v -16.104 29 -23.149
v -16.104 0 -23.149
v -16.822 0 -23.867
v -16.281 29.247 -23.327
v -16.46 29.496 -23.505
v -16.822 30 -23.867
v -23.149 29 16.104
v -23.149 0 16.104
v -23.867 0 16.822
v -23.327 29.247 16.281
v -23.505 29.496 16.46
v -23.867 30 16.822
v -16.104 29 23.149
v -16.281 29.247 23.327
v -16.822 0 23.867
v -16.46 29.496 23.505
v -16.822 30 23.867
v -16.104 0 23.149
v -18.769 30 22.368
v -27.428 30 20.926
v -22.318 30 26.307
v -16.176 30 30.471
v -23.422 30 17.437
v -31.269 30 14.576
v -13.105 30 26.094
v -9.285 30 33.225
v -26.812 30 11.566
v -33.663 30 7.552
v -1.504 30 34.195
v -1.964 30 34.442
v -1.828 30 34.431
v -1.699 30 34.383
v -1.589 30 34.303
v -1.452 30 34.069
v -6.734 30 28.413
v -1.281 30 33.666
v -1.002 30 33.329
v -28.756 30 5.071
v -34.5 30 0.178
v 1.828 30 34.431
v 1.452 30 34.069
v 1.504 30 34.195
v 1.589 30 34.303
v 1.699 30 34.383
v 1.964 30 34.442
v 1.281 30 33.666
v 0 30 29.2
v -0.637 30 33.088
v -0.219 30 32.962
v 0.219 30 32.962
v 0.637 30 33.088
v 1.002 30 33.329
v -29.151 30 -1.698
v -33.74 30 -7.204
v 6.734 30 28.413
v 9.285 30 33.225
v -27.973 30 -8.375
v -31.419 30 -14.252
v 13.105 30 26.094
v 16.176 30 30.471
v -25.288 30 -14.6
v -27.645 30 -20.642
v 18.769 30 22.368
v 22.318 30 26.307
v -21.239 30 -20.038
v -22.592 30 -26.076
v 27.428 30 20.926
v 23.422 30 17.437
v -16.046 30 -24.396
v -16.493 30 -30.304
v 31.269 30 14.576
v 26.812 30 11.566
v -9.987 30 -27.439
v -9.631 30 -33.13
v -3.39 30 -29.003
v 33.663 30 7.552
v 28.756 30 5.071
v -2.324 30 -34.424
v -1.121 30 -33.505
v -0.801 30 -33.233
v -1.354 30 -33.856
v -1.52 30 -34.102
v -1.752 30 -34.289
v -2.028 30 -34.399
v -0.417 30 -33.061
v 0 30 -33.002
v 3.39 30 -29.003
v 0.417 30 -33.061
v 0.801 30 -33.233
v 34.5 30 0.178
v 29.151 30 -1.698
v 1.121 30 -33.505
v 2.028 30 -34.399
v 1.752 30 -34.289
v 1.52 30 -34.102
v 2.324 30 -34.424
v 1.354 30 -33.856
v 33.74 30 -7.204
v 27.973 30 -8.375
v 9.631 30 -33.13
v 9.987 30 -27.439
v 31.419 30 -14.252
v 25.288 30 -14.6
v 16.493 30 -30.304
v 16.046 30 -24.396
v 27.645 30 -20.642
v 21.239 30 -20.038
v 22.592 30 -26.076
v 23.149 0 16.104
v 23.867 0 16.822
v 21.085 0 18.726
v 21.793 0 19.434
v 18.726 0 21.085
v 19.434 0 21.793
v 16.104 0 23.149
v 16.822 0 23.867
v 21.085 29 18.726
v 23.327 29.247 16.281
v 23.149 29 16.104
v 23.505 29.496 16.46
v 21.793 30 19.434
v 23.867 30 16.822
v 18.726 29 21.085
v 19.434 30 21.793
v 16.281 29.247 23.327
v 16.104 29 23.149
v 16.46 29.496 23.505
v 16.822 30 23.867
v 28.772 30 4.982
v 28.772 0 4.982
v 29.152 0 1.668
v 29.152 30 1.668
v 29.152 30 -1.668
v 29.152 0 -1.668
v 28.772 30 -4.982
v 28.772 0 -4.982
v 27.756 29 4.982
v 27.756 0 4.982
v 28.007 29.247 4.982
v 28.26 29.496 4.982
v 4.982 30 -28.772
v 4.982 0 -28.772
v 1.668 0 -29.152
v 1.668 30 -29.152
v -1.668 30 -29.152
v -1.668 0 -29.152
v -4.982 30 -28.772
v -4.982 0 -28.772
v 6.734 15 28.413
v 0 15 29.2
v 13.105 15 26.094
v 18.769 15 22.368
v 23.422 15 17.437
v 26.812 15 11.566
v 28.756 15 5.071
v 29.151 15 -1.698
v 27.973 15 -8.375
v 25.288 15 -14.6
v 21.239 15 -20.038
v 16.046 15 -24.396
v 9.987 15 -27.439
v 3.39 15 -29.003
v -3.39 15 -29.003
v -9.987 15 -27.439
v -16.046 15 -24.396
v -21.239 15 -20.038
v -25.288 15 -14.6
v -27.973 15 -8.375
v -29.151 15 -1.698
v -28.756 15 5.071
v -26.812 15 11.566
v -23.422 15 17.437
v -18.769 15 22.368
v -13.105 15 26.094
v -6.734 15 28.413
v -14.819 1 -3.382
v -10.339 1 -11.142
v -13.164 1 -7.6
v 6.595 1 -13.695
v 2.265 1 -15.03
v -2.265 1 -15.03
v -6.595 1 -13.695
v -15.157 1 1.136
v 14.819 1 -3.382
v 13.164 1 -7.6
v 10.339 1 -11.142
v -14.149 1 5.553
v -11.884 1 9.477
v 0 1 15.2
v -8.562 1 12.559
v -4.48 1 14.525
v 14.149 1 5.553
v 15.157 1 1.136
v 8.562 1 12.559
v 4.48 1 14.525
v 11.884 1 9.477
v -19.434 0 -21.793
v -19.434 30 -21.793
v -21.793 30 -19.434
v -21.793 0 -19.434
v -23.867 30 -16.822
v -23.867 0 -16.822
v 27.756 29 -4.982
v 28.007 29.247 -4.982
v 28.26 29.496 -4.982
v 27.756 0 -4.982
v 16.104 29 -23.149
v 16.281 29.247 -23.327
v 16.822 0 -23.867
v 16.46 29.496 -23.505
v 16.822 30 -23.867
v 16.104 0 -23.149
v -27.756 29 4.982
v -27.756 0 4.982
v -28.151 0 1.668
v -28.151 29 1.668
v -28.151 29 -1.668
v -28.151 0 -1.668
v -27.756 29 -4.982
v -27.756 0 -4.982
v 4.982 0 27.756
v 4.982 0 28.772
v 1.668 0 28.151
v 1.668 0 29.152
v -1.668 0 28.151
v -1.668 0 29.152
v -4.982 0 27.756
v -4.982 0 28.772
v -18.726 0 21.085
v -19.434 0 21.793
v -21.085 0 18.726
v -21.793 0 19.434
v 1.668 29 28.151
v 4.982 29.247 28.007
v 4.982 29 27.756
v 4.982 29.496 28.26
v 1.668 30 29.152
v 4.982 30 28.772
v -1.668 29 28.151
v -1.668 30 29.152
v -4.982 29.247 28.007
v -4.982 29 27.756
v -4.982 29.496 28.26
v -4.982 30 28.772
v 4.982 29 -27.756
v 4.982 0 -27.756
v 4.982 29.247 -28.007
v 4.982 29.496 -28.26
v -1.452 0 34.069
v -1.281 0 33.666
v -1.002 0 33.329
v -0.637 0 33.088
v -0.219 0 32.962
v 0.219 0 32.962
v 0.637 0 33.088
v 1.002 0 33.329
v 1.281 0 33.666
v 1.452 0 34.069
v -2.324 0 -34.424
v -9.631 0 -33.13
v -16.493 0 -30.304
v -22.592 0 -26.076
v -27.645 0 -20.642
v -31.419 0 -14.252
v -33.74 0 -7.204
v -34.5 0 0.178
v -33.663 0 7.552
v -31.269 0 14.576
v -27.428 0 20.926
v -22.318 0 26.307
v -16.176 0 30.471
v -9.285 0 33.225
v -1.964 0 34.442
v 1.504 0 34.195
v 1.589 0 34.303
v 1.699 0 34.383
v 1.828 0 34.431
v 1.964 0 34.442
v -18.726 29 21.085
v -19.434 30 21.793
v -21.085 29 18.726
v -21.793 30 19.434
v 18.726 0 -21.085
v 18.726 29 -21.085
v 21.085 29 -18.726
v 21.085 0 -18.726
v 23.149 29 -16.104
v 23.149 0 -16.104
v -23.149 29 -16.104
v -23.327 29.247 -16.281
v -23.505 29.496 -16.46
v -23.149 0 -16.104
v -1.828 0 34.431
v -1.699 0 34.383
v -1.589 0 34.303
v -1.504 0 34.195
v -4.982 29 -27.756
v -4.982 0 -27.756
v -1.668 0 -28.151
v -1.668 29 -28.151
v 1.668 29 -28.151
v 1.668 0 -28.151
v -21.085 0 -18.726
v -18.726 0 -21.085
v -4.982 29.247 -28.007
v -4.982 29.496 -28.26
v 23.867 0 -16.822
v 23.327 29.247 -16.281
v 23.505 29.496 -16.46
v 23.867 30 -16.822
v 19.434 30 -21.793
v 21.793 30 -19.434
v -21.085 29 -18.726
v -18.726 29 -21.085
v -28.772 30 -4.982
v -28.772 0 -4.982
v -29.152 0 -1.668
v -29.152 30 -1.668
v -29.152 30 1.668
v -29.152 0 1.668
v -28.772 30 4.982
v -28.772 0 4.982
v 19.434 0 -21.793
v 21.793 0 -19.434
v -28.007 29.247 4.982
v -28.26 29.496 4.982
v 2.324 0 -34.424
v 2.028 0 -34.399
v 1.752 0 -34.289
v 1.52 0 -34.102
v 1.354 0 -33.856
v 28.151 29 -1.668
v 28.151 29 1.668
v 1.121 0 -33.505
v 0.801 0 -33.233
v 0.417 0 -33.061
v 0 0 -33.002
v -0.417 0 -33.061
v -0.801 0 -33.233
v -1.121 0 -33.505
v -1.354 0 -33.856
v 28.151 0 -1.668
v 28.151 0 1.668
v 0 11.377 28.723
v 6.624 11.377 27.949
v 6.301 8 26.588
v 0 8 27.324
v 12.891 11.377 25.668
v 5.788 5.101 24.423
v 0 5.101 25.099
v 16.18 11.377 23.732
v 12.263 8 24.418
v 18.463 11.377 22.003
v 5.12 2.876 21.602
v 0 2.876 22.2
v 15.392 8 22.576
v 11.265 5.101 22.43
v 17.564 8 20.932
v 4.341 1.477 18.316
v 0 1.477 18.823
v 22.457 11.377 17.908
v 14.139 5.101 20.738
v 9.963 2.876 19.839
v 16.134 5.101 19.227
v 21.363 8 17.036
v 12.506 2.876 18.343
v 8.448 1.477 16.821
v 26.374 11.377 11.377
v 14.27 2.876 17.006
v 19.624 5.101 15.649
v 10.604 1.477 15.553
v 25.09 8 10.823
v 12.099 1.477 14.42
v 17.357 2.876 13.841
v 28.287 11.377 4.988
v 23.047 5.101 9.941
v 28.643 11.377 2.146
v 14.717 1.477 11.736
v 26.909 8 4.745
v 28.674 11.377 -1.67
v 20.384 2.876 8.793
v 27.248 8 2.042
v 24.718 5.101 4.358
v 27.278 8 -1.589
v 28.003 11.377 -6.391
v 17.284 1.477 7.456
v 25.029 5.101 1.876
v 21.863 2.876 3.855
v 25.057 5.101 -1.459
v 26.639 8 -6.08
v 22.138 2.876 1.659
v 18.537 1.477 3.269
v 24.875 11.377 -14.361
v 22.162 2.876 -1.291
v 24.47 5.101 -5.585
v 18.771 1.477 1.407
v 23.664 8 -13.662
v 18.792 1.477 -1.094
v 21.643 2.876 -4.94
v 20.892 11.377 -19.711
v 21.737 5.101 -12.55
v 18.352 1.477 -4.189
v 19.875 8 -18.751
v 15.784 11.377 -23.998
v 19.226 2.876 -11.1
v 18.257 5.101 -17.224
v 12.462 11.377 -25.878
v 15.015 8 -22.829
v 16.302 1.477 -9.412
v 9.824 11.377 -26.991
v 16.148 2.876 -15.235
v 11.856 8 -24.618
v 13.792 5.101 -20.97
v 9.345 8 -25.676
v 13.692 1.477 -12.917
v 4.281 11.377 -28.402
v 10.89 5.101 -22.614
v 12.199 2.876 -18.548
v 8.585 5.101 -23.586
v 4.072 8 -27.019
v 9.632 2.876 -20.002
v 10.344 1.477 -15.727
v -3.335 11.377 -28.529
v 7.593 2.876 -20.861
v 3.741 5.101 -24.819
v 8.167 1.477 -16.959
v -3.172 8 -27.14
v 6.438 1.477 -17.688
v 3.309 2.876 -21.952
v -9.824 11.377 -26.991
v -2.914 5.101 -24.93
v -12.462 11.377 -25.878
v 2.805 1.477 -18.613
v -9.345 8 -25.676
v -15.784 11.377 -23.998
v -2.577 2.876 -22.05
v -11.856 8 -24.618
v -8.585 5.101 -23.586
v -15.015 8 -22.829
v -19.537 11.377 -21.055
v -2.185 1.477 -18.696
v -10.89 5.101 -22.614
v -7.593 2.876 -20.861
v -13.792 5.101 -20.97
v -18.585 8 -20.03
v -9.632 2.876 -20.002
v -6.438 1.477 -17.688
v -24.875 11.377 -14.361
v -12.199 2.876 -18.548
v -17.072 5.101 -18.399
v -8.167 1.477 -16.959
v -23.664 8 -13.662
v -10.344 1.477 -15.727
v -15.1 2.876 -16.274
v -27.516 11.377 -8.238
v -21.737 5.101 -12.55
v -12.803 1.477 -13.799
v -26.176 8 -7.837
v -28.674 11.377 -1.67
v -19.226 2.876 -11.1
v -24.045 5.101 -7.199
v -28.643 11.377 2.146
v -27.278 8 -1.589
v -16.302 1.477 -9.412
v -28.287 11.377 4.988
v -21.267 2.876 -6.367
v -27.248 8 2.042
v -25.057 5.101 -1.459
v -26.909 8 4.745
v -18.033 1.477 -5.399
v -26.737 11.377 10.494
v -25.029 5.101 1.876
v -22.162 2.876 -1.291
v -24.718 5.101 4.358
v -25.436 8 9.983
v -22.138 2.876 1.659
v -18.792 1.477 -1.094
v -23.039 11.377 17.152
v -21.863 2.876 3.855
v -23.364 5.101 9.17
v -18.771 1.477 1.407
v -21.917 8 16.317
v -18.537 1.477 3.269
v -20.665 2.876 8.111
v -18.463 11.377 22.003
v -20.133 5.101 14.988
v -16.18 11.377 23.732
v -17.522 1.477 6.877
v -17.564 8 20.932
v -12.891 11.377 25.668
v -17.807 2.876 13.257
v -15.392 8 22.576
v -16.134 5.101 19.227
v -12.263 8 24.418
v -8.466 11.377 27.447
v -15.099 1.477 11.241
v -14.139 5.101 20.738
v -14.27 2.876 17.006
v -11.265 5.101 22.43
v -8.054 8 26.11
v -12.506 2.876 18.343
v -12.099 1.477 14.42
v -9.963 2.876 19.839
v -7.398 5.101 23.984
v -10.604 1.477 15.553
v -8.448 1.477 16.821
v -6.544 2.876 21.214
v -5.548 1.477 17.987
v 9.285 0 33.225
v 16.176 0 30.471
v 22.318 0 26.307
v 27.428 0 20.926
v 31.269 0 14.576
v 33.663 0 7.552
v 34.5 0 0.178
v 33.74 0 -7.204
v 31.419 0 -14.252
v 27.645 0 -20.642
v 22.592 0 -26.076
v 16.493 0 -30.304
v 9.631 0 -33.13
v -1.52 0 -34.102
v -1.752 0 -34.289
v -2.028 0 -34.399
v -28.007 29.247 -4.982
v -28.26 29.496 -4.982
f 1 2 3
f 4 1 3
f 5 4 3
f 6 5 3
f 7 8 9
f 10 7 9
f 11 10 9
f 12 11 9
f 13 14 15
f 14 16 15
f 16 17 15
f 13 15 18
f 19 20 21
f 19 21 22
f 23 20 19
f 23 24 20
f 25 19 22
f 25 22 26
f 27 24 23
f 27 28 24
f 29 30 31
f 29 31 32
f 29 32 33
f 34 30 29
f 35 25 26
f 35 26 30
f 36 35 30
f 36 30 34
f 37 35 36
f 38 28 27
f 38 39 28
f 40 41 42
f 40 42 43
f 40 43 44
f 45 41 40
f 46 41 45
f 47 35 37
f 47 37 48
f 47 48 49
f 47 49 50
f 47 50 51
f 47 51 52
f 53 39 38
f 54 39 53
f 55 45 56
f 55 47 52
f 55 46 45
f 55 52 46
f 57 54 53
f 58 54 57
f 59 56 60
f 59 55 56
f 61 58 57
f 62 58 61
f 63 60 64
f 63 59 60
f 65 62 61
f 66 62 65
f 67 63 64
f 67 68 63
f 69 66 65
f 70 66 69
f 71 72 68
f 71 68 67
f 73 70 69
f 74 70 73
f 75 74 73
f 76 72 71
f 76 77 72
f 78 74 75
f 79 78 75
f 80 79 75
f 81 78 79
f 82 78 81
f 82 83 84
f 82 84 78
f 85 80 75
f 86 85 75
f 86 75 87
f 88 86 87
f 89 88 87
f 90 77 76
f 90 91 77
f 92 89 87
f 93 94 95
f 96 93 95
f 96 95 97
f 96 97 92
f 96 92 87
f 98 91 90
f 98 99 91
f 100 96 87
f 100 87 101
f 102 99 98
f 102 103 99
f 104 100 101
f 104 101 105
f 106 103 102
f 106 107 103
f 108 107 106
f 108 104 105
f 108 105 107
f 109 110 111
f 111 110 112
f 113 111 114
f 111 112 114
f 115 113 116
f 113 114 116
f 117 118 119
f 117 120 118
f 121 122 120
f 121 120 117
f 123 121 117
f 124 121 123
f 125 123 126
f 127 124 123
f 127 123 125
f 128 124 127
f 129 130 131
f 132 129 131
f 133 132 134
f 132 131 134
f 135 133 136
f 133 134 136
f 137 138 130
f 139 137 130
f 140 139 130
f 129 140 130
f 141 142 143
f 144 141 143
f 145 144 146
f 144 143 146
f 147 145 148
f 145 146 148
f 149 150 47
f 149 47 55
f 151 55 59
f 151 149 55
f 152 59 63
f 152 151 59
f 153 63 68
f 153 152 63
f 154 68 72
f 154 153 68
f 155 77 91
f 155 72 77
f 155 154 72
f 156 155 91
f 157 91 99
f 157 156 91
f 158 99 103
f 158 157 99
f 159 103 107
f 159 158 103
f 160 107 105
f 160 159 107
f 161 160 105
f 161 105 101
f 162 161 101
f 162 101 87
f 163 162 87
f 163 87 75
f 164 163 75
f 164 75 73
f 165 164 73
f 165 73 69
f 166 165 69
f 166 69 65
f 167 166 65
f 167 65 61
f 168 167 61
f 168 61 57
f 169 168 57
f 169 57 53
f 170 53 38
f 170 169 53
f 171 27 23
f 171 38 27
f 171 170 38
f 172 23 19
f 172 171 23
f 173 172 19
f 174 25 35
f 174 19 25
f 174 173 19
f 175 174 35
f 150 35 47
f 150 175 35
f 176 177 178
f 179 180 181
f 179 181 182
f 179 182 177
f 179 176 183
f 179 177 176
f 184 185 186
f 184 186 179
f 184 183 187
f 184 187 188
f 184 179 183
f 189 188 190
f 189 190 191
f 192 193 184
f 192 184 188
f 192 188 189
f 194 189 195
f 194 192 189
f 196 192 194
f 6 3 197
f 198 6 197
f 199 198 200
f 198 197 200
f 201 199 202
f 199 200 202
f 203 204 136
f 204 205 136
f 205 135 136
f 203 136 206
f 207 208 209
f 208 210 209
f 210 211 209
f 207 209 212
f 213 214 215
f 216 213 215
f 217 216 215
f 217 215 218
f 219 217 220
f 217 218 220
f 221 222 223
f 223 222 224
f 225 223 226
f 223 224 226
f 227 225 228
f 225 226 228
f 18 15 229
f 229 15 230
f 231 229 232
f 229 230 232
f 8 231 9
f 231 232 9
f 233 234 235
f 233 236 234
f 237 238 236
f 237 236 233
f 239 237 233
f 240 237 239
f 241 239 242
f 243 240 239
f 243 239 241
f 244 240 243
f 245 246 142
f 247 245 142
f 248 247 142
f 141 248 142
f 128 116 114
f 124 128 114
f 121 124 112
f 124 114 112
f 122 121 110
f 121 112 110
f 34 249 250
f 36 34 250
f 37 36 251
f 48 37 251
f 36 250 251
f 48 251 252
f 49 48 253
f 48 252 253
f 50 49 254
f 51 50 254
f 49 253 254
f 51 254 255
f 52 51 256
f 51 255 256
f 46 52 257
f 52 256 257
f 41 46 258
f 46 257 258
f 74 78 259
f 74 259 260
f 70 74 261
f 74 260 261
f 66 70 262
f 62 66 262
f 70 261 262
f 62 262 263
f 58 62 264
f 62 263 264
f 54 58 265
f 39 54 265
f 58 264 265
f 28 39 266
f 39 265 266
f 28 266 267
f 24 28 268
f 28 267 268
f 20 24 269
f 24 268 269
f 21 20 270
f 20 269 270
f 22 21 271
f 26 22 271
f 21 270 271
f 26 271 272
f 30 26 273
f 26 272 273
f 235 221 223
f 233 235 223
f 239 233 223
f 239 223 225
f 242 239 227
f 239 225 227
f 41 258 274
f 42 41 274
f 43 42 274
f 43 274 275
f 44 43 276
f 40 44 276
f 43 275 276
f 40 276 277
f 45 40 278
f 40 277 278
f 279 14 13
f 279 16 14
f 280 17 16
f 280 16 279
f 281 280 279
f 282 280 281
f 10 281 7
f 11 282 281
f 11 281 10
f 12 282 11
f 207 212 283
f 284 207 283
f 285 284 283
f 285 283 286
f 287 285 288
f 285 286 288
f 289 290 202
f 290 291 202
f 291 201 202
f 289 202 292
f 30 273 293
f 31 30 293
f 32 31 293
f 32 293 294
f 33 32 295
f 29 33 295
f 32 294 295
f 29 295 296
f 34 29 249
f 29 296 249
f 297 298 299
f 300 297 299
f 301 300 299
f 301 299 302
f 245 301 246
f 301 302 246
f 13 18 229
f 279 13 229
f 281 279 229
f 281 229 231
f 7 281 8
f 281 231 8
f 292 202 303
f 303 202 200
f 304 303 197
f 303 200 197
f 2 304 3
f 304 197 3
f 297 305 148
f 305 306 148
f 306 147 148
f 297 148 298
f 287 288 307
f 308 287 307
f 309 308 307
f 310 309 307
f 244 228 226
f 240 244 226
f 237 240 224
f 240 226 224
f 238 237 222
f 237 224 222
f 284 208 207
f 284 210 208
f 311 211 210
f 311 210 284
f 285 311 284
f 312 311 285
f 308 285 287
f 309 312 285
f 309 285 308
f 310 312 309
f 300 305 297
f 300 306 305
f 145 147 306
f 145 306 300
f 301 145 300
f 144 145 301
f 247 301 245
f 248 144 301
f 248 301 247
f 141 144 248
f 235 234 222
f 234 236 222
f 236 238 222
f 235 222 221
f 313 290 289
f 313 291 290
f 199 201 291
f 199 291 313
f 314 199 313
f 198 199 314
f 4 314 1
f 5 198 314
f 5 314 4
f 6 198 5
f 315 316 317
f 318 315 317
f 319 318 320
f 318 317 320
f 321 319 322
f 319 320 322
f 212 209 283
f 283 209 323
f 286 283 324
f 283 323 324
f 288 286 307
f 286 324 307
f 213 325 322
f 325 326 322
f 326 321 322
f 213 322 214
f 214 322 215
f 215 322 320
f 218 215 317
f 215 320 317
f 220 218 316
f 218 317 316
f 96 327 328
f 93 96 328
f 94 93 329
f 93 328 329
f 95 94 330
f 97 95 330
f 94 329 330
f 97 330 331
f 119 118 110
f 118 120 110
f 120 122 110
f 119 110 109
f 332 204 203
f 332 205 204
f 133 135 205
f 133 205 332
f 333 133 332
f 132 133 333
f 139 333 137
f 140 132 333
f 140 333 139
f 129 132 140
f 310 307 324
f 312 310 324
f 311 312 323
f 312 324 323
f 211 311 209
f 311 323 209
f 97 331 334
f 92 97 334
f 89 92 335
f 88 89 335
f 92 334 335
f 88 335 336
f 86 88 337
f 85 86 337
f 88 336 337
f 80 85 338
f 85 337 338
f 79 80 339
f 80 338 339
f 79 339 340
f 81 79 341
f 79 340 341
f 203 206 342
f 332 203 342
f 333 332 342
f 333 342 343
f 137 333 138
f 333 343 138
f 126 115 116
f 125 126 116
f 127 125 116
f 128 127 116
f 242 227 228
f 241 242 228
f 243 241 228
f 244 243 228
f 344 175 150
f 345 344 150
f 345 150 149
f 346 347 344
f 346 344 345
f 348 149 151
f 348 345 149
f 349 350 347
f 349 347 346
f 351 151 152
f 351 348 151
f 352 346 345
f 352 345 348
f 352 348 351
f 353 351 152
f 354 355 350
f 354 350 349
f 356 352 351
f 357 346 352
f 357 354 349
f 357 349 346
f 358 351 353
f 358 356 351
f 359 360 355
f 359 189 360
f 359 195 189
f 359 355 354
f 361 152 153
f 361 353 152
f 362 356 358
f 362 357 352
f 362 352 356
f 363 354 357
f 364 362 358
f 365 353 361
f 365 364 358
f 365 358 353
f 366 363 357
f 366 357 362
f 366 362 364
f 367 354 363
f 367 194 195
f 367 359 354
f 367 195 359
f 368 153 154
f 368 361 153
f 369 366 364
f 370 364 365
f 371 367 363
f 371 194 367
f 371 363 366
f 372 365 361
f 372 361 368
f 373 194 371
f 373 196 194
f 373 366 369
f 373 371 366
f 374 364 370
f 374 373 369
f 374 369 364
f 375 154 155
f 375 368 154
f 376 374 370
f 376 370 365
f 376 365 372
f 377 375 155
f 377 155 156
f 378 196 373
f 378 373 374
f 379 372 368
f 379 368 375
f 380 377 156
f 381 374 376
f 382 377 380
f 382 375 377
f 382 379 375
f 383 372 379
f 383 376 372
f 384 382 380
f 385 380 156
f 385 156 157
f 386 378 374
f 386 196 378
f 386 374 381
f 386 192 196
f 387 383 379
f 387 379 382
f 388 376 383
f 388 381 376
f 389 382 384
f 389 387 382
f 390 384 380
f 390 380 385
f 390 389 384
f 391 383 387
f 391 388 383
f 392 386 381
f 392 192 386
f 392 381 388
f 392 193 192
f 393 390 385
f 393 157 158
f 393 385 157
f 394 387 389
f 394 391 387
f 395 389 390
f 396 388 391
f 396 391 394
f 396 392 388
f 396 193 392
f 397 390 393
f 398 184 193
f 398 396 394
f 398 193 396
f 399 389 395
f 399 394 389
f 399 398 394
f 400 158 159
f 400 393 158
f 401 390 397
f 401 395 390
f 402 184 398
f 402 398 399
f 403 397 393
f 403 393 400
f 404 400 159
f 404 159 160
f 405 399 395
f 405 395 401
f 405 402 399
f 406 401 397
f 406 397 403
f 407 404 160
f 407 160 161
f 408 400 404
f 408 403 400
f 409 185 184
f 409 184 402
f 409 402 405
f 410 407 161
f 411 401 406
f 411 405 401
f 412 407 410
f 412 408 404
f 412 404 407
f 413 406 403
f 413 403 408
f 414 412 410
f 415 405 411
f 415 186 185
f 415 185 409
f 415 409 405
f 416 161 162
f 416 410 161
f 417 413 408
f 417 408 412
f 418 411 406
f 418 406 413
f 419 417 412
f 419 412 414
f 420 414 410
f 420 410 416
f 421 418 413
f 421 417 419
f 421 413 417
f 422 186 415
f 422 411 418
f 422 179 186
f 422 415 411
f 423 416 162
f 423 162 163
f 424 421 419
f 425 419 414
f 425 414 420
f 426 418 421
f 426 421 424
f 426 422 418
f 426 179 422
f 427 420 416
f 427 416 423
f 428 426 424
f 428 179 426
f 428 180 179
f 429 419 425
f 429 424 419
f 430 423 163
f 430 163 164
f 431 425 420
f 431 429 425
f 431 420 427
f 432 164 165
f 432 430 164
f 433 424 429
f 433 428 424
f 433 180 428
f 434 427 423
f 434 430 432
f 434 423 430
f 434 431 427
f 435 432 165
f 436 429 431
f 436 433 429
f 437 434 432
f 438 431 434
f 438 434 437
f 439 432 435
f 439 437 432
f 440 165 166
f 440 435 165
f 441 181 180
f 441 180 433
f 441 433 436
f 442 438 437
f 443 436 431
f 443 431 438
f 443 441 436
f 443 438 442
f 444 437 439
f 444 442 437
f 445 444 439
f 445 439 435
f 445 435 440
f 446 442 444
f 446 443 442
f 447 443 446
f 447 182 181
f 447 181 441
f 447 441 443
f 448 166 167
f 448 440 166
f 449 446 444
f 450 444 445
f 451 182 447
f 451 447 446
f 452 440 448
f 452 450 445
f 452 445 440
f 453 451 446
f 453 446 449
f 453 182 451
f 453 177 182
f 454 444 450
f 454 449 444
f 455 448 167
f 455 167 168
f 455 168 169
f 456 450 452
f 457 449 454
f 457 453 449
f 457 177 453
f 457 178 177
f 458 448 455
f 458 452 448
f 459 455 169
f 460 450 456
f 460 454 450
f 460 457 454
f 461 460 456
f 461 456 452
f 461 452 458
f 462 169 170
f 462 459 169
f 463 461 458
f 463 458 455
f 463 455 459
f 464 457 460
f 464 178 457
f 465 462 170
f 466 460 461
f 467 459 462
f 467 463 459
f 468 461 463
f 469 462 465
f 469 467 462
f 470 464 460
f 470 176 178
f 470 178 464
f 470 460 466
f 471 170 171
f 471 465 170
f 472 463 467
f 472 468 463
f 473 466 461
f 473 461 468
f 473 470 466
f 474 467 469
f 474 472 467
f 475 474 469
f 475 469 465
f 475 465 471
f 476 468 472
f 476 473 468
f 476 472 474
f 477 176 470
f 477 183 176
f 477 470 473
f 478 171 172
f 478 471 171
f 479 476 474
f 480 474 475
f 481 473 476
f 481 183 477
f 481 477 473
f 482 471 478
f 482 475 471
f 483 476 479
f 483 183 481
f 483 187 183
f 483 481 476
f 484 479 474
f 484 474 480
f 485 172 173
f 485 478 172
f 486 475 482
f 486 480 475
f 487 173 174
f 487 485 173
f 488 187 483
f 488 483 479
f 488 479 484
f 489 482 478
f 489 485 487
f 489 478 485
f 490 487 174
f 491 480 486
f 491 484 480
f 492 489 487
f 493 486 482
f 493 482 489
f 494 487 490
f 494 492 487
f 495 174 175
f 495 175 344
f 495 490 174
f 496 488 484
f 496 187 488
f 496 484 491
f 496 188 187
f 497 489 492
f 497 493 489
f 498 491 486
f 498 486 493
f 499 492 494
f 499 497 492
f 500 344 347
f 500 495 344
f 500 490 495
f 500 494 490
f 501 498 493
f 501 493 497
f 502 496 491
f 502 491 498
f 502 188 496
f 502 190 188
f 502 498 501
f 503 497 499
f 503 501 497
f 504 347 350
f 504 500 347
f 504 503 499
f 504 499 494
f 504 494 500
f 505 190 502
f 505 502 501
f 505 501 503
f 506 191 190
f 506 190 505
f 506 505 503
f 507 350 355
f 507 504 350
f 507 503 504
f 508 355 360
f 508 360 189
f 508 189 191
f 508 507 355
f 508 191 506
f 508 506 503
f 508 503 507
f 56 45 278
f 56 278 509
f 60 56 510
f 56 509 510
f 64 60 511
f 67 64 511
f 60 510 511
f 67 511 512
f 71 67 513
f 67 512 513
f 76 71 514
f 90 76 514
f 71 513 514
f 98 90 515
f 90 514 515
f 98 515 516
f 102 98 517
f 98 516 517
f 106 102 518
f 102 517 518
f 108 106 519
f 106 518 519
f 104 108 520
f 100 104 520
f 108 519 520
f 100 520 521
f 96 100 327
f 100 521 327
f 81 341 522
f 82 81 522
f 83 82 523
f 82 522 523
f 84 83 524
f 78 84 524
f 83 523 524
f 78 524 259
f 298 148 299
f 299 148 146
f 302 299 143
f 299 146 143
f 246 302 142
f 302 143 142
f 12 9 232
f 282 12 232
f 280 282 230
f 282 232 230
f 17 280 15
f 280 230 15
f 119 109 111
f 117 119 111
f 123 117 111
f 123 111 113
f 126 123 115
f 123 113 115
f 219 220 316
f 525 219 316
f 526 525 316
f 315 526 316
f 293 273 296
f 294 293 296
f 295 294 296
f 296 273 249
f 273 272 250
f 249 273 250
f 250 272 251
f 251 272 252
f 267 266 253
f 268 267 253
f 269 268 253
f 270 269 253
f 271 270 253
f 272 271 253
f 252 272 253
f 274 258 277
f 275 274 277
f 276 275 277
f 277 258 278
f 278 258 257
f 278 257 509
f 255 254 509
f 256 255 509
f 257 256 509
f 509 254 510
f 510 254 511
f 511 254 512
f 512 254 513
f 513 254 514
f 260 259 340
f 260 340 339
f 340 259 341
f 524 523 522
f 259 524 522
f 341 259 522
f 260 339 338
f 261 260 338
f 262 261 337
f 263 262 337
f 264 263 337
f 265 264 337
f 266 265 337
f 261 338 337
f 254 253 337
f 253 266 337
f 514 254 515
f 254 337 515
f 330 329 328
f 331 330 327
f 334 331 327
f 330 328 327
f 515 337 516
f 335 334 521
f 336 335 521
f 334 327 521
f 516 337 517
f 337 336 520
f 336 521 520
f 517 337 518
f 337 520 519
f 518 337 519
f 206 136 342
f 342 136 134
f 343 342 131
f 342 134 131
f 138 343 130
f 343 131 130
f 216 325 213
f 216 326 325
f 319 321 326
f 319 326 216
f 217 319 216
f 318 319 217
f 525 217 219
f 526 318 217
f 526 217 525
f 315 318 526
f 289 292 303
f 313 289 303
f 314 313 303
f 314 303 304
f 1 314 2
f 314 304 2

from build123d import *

# Parameters (mm, degrees)
BOSS_EXTRUDE1_DEPTH = 30
CUT_EXTRUDE2_REACH  = 60.241
CUT_EXTRUDE2_START  = 1
SKETCH2_R           = 29.2
BOSS_EXTRUDE2_DEPTH = 30
CHAMFER2_SIZE       = 1
CIRPATTERN2_COUNT   = 8
FILLET2_R           = 14


with BuildPart() as part:
    # Sketch1 → Boss-Extrude1 (new body)
    with BuildSketch(Plane(origin=(0, 0, 0), x_dir=(1, 0, 0), z_dir=(0, 1, 0))):
        with BuildLine():
            ThreePointArc((1.451818925, -34.068556857), (1.641248992, -34.346908706), (1.964225605, -34.442038138))
            ThreePointArc((1.964225605, -34.442038138), (34.499528846, -0.178302888), (2.324135821, 34.423627607))
            ThreePointArc((2.324135821, 34.423627607), (1.751838249, 34.289058819), (1.354061739, 33.856153382))
            ThreePointArc((1.354061739, 33.856153382), (0, 33.001534515), (-1.354061739, 33.856153382))
            ThreePointArc((-1.354061739, 33.856153382), (-1.751838249, 34.289058819), (-2.324135821, 34.423627607))
            ThreePointArc((-2.324135821, 34.423627607), (-34.499528846, -0.178302888), (-1.964225605, -34.442038138))
            ThreePointArc((-1.964225605, -34.442038138), (-1.641248992, -34.346908706), (-1.451818925, -34.068556857))
            ThreePointArc((-1.451818925, -34.068556857), (0, -32.945679925), (1.451818925, -34.068556857))
        make_face()
    extrude(amount=BOSS_EXTRUDE1_DEPTH)

    # Sketch2 → Cut-Extrude2 (cut, up to next)
    with BuildSketch(Plane(origin=(0, 0, 0), x_dir=(1, 0, 0), z_dir=(0, 1, 0)).offset(CUT_EXTRUDE2_START), mode=Mode.PRIVATE) as cut_extrude2_sk1:
        with Locations(Location((0, 0, 0), (0, 0, 270))):
            Circle(SKETCH2_R)
    cut_extrude2_tool1 = extrude(cut_extrude2_sk1.sketch, amount=CUT_EXTRUDE2_REACH, mode=Mode.PRIVATE) & part.part
    add(cut_extrude2_tool1.solids().sort_by_distance((0, 1, 0))[0], mode=Mode.SUBTRACT)

    # Fillet2
    fillet2_edges = [part.edges().sort_by_distance(p)[0] for p in [
        (0, 1, -29.2),
    ]]
    fillet(fillet2_edges, radius=FILLET2_R)


with BuildPart() as body_2:
    # Sketch2<2> → Boss-Extrude2 (new body)
    with BuildSketch(Plane(origin=(0, 0, 0), x_dir=(1, 0, 0), z_dir=(0, 1, 0))):
        with BuildLine():
            ThreePointArc((4.981640858, 28.771917808), (0, 29.2), (-4.981640858, 28.771917808))
            Line((-4.981640858, 28.771917808), (-4.981640858, 27.756499318))
            ThreePointArc((-4.981640858, 27.756499318), (0, 28.2), (4.981640858, 27.756499318))
            Line((4.981640858, 27.756499318), (4.981640858, 28.771917808))
        make_face()
    extrude(amount=BOSS_EXTRUDE2_DEPTH)

    # Chamfer2
    chamfer2_edges = [body_2.edges().sort_by_distance(p)[0] for p in [
        (0, 30, -28.2),
    ]]
    chamfer(chamfer2_edges, length=CHAMFER2_SIZE - 0.0001)  # a hair under: the kernel refuses the full size


with BuildPart() as cirpattern2_1:
    # CirPattern2: pattern copy
    add(body_2.part.rotate(Axis((0, 0, 0), (0, 1, 0)), 1 * 360 / CIRPATTERN2_COUNT))


with BuildPart() as cirpattern2_2:
    # CirPattern2: pattern copy
    add(body_2.part.rotate(Axis((0, 0, 0), (0, 1, 0)), 2 * 360 / CIRPATTERN2_COUNT))


with BuildPart() as cirpattern2_3:
    # CirPattern2: pattern copy
    add(body_2.part.rotate(Axis((0, 0, 0), (0, 1, 0)), 3 * 360 / CIRPATTERN2_COUNT))


with BuildPart() as cirpattern2_4:
    # CirPattern2: pattern copy
    add(body_2.part.rotate(Axis((0, 0, 0), (0, 1, 0)), 4 * 360 / CIRPATTERN2_COUNT))


with BuildPart() as cirpattern2_5:
    # CirPattern2: pattern copy
    add(body_2.part.rotate(Axis((0, 0, 0), (0, 1, 0)), 5 * 360 / CIRPATTERN2_COUNT))


with BuildPart() as cirpattern2_6:
    # CirPattern2: pattern copy
    add(body_2.part.rotate(Axis((0, 0, 0), (0, 1, 0)), 6 * 360 / CIRPATTERN2_COUNT))


with BuildPart() as cirpattern2_7:
    # CirPattern2: pattern copy
    add(body_2.part.rotate(Axis((0, 0, 0), (0, 1, 0)), 7 * 360 / CIRPATTERN2_COUNT))


solid = Compound([part.part, body_2.part, cirpattern2_1.part, cirpattern2_2.part, cirpattern2_3.part, cirpattern2_4.part, cirpattern2_5.part, cirpattern2_6.part, cirpattern2_7.part])
